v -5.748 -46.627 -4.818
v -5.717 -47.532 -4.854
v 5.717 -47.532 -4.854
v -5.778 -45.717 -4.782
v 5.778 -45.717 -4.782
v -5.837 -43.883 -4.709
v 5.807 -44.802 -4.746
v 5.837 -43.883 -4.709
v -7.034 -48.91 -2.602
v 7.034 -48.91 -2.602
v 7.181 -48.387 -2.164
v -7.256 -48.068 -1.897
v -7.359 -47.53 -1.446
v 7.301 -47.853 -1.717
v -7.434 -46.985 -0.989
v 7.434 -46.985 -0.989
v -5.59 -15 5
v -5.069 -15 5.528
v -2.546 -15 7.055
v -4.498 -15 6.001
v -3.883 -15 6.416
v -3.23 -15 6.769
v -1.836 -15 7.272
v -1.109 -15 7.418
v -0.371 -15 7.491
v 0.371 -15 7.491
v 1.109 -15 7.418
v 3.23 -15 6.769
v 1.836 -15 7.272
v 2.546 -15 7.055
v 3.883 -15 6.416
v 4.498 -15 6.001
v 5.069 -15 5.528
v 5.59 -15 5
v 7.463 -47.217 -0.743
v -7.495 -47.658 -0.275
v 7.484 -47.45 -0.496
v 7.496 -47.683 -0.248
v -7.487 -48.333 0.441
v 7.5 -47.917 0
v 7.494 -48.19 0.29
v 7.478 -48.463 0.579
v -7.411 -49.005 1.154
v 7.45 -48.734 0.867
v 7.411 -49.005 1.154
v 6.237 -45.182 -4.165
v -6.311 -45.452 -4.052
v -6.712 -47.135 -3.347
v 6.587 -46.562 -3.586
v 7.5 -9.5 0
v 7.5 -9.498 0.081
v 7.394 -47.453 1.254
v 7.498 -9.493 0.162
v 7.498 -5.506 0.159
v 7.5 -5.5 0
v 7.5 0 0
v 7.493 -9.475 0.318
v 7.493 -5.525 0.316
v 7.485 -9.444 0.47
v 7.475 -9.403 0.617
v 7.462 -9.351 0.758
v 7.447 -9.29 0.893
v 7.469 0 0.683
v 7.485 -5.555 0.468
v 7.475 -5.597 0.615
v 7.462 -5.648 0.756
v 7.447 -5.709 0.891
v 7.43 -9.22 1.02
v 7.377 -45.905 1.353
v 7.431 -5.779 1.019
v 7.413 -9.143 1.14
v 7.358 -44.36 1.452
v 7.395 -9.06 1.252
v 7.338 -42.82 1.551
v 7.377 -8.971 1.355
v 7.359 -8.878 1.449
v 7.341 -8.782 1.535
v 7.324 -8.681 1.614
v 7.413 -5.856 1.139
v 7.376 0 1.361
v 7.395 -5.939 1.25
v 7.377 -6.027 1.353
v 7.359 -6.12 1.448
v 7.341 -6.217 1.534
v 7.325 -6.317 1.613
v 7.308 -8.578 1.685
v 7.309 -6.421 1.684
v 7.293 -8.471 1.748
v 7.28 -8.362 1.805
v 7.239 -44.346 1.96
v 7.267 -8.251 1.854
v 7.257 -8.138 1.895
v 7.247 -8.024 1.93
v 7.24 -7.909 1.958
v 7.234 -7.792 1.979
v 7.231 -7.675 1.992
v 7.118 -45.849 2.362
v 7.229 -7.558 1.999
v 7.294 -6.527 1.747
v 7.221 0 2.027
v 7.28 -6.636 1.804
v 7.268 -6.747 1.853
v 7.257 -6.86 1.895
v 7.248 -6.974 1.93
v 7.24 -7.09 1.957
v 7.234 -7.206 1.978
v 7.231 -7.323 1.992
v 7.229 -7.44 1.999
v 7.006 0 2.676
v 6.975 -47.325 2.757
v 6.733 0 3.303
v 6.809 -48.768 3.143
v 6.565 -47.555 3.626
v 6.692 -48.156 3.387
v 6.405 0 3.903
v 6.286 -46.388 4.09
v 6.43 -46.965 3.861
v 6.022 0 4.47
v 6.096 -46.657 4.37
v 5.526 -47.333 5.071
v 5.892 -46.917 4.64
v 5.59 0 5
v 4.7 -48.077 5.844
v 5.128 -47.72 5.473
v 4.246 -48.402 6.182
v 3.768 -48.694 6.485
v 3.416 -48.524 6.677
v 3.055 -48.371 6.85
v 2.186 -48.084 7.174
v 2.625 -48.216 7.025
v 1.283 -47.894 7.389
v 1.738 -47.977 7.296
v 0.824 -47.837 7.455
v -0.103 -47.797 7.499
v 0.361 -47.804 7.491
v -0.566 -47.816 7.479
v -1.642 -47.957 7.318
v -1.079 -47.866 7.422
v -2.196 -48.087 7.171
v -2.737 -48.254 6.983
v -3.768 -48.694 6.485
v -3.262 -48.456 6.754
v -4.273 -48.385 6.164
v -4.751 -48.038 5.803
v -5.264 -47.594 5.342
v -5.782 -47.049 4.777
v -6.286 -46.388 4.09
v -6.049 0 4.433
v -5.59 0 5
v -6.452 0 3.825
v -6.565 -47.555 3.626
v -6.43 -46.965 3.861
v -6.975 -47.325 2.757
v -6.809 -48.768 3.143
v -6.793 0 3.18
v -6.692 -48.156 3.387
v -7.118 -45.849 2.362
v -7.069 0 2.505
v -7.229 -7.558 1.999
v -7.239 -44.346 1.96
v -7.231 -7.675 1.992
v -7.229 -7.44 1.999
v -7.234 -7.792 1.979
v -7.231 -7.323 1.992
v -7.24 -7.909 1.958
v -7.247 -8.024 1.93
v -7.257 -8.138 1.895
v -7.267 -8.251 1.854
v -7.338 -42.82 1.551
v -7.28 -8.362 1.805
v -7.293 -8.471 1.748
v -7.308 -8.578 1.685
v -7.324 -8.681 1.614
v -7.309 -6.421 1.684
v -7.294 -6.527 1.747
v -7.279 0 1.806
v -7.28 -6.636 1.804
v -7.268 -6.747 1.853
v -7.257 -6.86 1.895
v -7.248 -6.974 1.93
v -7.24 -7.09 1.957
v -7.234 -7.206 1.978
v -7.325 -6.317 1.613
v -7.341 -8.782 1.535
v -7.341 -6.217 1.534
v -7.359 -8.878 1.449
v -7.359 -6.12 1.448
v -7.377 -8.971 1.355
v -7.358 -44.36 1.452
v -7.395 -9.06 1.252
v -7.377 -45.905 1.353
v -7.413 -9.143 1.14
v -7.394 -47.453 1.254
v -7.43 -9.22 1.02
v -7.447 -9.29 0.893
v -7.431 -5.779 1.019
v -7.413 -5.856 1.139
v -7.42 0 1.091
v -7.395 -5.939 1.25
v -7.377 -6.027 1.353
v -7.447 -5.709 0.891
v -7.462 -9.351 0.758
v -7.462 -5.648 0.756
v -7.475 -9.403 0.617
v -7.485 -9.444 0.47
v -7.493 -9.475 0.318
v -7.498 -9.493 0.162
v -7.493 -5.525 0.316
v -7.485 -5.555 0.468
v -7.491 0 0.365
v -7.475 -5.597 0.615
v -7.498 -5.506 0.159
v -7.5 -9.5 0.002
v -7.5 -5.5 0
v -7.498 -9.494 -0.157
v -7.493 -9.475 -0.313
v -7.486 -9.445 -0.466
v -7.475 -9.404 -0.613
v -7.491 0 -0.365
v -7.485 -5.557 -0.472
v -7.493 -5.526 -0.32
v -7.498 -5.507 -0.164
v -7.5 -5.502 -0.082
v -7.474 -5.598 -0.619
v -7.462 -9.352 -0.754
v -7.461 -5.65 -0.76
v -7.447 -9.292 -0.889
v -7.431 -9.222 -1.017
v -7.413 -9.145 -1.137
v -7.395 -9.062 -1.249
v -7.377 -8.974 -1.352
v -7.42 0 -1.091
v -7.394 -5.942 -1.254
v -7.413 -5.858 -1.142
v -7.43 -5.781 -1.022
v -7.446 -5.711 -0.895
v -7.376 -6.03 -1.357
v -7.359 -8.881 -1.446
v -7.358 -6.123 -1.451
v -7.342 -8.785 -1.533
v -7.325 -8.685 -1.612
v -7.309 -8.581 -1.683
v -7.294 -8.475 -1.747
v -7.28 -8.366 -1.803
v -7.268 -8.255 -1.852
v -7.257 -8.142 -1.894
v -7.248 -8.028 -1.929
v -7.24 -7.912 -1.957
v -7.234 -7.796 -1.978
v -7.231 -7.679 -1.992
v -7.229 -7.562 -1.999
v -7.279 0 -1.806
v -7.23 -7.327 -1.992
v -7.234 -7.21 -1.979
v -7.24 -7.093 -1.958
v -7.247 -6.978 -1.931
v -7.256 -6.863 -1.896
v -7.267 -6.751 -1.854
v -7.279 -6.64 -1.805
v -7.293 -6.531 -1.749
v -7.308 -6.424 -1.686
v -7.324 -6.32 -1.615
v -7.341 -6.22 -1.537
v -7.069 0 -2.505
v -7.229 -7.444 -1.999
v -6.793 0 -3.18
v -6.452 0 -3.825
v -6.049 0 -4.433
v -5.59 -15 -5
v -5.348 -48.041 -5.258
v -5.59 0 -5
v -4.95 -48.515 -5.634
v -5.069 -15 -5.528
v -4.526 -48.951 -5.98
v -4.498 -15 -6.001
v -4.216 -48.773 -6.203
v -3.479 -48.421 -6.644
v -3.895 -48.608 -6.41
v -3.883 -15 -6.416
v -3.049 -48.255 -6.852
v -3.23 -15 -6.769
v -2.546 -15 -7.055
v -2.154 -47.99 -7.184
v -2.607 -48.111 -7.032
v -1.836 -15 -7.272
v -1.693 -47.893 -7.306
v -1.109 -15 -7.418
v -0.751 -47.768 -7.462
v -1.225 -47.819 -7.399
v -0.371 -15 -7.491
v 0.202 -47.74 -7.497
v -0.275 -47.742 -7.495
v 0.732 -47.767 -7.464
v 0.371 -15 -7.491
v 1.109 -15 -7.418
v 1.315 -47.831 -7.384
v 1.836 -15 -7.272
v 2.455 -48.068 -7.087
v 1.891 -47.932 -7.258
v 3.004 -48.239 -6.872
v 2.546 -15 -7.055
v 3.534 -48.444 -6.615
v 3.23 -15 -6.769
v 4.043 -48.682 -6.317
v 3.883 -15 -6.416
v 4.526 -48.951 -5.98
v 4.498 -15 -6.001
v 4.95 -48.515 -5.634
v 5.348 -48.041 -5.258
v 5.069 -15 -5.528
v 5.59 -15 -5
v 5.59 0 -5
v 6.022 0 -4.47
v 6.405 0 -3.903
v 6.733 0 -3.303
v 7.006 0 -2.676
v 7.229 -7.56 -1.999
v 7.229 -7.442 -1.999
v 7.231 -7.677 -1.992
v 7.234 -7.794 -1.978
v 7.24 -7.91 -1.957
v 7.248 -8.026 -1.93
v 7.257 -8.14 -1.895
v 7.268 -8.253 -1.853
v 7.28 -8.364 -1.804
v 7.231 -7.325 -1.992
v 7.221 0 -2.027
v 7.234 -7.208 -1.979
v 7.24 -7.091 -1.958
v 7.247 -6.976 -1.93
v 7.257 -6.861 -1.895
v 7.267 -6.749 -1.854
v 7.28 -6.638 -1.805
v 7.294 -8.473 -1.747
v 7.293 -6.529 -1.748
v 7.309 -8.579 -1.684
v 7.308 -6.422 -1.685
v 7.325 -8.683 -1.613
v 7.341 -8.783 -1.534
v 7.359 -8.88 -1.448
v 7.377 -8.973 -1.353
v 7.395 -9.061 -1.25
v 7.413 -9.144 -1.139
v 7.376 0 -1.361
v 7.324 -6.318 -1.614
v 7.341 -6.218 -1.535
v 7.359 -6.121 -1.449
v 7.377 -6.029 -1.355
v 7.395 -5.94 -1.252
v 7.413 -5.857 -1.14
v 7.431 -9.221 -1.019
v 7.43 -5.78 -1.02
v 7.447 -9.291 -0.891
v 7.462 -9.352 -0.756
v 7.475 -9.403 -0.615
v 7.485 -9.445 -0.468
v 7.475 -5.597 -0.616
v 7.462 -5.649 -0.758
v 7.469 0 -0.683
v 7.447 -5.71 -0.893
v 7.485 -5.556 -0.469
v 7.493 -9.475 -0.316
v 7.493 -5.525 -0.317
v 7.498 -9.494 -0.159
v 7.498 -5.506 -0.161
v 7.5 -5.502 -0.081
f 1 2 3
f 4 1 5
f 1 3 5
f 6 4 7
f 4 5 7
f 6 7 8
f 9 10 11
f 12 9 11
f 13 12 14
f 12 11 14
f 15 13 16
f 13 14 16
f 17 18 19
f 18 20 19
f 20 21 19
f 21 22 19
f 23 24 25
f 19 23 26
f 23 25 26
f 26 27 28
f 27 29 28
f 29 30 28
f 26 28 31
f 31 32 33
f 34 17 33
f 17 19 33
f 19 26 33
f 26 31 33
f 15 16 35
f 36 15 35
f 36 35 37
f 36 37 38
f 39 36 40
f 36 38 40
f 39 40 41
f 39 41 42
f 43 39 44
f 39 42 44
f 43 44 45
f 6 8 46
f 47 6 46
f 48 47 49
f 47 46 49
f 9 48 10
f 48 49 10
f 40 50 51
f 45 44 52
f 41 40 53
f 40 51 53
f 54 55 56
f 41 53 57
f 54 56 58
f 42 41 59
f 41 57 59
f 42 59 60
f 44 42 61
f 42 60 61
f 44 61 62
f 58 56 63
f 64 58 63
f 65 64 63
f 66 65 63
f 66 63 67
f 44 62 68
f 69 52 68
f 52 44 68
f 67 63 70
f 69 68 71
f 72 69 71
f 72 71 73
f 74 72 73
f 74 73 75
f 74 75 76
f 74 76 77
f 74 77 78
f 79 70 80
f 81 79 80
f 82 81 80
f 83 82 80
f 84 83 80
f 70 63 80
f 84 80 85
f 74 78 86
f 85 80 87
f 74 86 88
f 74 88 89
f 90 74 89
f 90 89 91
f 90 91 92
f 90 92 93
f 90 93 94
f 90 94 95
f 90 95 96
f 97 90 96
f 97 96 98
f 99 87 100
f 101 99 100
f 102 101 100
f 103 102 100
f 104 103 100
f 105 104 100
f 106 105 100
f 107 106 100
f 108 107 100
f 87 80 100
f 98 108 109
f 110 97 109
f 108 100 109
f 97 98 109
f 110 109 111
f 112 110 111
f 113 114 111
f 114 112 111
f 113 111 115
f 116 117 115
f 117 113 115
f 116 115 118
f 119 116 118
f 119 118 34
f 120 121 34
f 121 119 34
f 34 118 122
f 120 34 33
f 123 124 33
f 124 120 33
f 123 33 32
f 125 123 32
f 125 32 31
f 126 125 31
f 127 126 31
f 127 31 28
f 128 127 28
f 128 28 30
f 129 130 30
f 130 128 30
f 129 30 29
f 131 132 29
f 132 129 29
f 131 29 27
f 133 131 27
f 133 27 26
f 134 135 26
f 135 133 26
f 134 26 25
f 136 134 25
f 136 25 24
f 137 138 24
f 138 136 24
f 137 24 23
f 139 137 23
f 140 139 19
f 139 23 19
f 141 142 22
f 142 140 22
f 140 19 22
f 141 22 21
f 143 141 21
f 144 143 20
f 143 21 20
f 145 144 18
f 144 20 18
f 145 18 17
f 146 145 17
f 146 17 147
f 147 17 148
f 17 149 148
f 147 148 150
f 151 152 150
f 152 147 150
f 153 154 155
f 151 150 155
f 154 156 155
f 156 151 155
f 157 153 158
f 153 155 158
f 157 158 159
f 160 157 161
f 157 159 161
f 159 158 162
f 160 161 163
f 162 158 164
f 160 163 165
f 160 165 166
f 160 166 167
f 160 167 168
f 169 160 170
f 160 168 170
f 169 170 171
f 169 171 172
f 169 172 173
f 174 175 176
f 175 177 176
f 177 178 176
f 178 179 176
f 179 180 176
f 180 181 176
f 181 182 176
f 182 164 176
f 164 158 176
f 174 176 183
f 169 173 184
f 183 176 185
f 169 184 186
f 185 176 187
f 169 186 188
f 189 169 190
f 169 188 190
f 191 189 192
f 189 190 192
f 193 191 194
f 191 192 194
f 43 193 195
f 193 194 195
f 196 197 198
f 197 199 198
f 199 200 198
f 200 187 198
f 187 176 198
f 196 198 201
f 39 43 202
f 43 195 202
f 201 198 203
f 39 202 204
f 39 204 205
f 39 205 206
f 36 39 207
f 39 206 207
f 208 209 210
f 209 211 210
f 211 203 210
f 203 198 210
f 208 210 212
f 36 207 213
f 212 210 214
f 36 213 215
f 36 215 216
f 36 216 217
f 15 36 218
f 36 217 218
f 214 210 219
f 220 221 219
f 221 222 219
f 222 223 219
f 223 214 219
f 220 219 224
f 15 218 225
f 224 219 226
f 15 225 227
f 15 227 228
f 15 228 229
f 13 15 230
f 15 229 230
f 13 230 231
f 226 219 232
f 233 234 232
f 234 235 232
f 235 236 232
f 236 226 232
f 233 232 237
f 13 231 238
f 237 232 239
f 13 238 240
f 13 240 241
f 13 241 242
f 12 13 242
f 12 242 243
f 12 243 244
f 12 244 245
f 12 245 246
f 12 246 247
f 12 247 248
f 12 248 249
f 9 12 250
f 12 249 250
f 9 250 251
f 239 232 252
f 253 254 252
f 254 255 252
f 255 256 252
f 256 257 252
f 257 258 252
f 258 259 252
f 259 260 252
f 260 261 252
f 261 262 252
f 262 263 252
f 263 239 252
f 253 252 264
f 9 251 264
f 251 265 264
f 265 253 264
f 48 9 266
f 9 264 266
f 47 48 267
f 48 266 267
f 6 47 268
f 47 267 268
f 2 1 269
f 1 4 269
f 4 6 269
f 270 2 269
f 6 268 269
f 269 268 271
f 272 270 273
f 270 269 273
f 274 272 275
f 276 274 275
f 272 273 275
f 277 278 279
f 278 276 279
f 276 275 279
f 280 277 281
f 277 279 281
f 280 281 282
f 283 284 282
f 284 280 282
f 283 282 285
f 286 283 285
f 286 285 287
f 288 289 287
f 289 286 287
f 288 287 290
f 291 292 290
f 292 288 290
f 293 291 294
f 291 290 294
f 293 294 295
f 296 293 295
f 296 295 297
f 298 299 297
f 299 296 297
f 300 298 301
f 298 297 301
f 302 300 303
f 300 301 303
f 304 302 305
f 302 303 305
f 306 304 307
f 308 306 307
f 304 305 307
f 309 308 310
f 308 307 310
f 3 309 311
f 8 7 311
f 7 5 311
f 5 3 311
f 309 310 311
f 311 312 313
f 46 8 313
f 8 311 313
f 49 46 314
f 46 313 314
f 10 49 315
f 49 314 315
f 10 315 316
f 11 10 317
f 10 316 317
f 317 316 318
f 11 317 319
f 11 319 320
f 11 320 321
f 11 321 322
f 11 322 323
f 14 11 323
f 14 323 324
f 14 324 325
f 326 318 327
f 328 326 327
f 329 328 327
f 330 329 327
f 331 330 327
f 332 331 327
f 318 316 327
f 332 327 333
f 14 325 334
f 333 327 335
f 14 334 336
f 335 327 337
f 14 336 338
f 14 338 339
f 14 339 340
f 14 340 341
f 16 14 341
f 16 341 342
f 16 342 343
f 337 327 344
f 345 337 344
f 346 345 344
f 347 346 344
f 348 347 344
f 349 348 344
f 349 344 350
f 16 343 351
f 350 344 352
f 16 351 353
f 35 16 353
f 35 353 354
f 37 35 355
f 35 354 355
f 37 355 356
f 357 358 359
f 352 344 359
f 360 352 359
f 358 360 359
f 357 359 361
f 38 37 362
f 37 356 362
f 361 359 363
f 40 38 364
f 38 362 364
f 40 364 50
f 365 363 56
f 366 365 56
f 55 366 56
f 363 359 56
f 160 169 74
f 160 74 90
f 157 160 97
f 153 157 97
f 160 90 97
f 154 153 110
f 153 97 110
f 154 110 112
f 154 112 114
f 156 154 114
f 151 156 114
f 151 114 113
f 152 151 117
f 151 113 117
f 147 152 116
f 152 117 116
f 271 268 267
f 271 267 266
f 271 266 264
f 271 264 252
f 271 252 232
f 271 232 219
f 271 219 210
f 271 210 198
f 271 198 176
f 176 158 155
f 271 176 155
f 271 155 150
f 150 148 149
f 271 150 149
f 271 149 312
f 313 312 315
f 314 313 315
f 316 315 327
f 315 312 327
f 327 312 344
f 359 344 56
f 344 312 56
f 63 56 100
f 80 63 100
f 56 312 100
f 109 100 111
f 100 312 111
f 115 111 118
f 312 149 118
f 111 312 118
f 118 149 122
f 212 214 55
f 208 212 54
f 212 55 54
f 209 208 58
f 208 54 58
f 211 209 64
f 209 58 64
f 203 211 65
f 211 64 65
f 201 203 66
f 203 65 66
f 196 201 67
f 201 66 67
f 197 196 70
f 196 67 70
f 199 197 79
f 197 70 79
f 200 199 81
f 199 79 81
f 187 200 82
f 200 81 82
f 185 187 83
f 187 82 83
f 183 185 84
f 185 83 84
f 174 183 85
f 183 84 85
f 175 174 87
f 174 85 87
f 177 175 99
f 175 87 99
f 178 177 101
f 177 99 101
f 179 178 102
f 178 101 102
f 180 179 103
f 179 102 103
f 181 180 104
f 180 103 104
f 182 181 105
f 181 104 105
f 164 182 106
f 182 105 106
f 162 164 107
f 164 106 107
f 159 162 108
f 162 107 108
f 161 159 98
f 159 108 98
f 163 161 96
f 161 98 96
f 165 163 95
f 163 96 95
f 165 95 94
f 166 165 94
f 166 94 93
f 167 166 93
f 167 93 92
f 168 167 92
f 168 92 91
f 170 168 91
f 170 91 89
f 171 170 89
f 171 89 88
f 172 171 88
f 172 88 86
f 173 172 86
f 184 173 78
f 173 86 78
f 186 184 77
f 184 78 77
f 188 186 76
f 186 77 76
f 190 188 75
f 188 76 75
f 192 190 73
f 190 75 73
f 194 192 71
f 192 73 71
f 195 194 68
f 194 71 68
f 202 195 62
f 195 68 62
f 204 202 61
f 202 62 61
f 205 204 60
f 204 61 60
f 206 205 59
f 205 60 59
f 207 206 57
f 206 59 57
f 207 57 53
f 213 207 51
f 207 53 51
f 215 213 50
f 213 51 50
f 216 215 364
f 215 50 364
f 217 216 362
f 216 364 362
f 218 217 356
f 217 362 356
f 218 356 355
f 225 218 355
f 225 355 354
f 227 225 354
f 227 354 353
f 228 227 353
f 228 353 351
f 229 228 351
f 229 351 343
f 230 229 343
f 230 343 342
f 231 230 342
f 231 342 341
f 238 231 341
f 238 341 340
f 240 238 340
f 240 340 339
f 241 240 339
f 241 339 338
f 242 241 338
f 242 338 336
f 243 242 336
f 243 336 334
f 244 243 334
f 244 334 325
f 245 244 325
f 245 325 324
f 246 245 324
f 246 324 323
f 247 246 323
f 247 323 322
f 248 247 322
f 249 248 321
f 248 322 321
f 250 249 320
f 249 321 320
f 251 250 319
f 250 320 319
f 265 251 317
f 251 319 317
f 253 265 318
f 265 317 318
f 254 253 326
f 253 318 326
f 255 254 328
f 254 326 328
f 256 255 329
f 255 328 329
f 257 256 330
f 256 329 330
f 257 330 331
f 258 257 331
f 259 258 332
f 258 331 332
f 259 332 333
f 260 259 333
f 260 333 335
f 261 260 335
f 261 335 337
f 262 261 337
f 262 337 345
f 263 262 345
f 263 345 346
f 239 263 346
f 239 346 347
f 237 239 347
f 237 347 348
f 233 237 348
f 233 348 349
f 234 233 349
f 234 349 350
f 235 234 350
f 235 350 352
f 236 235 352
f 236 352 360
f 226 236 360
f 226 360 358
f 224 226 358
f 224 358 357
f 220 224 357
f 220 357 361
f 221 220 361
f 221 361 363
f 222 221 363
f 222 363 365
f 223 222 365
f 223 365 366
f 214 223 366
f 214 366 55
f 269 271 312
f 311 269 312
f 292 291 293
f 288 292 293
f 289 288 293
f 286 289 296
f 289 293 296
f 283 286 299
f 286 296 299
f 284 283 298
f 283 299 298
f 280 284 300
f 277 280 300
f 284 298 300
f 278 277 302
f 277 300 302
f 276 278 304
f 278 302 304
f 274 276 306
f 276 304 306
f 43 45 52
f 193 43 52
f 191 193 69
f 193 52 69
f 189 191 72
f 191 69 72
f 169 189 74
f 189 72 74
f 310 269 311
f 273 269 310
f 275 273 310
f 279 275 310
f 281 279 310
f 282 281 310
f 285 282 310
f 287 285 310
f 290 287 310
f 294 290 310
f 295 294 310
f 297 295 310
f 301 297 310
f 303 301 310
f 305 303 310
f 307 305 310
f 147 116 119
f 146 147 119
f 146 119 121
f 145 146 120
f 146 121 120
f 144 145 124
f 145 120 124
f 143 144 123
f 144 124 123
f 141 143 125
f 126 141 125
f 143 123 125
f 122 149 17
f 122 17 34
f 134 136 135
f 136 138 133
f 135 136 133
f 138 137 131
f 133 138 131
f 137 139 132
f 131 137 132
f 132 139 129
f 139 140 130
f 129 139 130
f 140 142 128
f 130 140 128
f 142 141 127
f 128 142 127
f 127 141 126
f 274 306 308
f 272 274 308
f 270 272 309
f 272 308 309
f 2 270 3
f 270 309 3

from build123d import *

# Parameters (mm, degrees)
F0_R     = 7.5
F1_DEPTH = 50
F3_DEPTH = 12.5
F4_W     = 15
F4_H     = 7.736891
F4_H_2   = 4.14352
F5_DEPTH = 15
F6_R     = 2
F7_DEPTH = 12.5


with BuildPart() as f1:
    # F0 (on Front) → F1 (new body)
    with BuildSketch(Plane.XZ):
        Circle(F0_R)
    extrude(amount=F1_DEPTH)

    # F2 (on Right) → F3 (cut, symmetric)
    with BuildSketch(Plane.YZ):
        Polygon((-44.571992, 11.14893), (-51.264416, 11.14893), (-51.264416, -8.581314), (-47.007408, -8.41625), (-48.95056, -5.98029), (-47.531635, -4.853975), (-43.883123, -4.709495), (-48.910081, -2.602493), (-46.984833, -0.98913), (-49.004711, 1.153992), (-42.819649, 1.551311), (-48.76826, 3.143417), (-46.388377, 4.090473), (-48.69375, 6.484859), align=None)
    extrude(amount=F3_DEPTH, both=True, mode=Mode.SUBTRACT)

    # F4 (on Front) → F5 (cut)
    with BuildSketch(Plane.XZ):
        with Locations((-0.000368, -8.868445)):
            Rectangle(F4_W, F4_H)
        with Locations((0.000368, 7.07176)):
            Rectangle(F4_W, F4_H_2)
    extrude(amount=F5_DEPTH, mode=Mode.SUBTRACT)

    # F6 (on Right) → F7 (cut, symmetric)
    with BuildSketch(Plane.YZ):
        with Locations((-7.5, 0)):
            Circle(F6_R)
    extrude(amount=F7_DEPTH, both=True, mode=Mode.SUBTRACT)


solid = f1.part
